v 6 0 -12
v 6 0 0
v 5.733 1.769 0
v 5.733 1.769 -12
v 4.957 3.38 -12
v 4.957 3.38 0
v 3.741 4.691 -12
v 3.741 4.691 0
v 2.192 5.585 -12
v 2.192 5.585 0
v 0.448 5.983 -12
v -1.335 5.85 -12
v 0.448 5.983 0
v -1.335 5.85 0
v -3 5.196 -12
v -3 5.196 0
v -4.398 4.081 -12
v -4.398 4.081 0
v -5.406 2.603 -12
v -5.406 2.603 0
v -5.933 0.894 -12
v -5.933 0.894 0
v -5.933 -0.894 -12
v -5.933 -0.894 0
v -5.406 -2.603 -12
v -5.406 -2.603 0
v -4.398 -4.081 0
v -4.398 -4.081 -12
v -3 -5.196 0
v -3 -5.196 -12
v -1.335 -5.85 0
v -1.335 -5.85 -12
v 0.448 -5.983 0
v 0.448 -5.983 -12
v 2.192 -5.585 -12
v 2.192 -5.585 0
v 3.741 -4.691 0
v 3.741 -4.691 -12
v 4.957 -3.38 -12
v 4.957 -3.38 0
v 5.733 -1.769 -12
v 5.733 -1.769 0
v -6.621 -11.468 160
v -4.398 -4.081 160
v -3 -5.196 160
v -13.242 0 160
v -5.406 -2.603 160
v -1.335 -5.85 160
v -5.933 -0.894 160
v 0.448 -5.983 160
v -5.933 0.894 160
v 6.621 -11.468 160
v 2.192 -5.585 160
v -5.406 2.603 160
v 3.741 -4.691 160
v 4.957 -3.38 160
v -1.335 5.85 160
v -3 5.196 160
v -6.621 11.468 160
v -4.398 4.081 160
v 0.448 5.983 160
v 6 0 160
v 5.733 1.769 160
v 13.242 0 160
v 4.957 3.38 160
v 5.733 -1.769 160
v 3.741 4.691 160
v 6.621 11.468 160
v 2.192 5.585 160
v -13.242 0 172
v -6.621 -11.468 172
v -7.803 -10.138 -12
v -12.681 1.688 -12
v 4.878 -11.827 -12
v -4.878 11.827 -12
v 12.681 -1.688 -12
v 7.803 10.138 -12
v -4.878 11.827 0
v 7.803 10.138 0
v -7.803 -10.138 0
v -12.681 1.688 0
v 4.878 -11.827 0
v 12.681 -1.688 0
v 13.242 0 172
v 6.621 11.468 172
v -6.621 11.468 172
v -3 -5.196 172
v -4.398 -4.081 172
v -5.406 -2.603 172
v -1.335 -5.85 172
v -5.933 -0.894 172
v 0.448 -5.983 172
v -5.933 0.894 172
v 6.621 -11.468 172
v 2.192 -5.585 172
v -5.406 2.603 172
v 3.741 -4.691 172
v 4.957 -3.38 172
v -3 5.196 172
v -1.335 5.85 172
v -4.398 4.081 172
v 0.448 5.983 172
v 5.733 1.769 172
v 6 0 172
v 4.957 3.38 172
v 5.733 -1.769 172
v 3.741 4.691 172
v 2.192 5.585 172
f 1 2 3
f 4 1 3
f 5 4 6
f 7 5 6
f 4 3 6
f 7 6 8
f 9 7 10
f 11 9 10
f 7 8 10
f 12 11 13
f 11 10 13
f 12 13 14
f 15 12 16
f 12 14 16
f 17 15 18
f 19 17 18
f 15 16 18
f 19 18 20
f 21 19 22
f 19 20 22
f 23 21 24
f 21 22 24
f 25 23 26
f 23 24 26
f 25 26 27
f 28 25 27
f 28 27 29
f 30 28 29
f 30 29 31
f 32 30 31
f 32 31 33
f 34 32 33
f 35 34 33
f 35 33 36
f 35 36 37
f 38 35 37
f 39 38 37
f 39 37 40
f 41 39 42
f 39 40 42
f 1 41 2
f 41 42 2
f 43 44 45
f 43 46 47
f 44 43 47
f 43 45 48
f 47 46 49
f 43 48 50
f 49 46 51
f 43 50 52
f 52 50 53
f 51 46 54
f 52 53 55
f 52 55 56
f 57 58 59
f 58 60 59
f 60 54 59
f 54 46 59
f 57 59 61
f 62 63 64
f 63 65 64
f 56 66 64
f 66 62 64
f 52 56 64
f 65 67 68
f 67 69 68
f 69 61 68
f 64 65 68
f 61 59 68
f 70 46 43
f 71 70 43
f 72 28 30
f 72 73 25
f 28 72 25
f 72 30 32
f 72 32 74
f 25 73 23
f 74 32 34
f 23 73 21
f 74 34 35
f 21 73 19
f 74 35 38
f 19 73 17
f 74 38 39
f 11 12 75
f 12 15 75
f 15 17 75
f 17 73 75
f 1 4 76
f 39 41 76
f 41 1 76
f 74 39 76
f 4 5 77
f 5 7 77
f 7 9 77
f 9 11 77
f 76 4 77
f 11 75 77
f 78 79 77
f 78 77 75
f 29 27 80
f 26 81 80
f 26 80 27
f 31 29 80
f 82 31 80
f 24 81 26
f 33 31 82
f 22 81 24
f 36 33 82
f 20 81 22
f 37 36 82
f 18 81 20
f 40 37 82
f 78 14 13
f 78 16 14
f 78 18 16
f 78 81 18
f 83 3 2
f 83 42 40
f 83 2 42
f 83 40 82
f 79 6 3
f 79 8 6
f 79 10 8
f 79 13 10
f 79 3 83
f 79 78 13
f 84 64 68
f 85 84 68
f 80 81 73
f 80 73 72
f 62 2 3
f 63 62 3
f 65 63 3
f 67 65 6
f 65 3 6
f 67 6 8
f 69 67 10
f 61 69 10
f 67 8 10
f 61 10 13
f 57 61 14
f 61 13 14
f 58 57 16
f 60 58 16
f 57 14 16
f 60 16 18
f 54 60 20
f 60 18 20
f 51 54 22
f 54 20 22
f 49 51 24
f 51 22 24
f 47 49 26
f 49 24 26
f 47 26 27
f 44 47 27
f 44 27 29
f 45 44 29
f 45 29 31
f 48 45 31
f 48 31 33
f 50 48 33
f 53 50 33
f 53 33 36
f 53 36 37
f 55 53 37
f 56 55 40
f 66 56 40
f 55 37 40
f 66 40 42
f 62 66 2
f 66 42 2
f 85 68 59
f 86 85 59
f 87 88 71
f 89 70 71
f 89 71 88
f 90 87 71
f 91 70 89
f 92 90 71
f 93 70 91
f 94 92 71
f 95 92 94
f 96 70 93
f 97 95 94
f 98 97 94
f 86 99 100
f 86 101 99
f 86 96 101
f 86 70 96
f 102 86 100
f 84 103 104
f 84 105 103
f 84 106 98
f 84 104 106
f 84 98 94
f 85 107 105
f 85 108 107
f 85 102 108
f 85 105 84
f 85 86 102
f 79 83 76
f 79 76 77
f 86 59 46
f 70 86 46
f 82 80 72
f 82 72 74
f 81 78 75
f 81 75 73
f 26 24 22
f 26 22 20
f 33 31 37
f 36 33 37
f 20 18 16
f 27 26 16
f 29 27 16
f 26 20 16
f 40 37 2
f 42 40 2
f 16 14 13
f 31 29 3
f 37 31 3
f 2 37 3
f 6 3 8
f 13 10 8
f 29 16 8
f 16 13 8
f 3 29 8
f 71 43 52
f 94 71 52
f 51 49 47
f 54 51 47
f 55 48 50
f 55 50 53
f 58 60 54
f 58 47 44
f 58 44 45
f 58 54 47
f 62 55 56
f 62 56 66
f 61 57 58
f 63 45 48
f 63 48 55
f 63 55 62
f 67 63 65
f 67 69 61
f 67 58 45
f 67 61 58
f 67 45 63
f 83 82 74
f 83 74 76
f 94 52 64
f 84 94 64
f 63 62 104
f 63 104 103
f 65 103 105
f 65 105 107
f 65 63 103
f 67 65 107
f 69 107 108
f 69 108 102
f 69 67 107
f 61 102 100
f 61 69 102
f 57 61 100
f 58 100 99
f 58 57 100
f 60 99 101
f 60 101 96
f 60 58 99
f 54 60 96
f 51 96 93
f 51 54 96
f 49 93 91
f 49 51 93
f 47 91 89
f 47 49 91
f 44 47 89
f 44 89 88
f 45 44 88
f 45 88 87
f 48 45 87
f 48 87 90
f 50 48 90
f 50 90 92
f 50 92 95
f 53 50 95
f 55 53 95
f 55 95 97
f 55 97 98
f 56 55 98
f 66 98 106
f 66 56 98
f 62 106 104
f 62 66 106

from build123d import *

# Parameters (mm, degrees)
F0_R     = 6
F1_DEPTH = 160
F2_DEPTH = 12
F3_R     = 6
F4_DEPTH = 12


with BuildPart() as f1:
    # F0 (on Top) → F1 (new body)
    with BuildSketch(Plane.XY):
        Circle(F0_R)
    extrude(amount=F1_DEPTH)

    # F0 (on Top) → F2 (join)
    with BuildSketch(Plane.XY):
        Polygon((-4.8783502823, 11.8265430801), (-12.6812618875, 1.688496267), (-7.8029116052, -10.1380468131), (4.8783502823, -11.8265430801), (12.6812618875, -1.688496267), (7.8029116052, 10.1380468131), align=None)
        Circle(F0_R, mode=Mode.SUBTRACT)
    extrude(amount=-F2_DEPTH)


with BuildPart() as f4:
    # F3 (on face) → F4 (new body)
    with BuildSketch(Plane.XY.offset(160)):
        Polygon((-6.621212456, -11.4682763815), (6.621212456, -11.4682763815), (13.242424912, 0), (6.621212456, 11.4682763815), (-6.621212456, 11.4682763815), (-13.242424912, 0), align=None)
        Circle(F3_R, mode=Mode.SUBTRACT)
    extrude(amount=F4_DEPTH)


solid = Compound([f1.part, f4.part])
